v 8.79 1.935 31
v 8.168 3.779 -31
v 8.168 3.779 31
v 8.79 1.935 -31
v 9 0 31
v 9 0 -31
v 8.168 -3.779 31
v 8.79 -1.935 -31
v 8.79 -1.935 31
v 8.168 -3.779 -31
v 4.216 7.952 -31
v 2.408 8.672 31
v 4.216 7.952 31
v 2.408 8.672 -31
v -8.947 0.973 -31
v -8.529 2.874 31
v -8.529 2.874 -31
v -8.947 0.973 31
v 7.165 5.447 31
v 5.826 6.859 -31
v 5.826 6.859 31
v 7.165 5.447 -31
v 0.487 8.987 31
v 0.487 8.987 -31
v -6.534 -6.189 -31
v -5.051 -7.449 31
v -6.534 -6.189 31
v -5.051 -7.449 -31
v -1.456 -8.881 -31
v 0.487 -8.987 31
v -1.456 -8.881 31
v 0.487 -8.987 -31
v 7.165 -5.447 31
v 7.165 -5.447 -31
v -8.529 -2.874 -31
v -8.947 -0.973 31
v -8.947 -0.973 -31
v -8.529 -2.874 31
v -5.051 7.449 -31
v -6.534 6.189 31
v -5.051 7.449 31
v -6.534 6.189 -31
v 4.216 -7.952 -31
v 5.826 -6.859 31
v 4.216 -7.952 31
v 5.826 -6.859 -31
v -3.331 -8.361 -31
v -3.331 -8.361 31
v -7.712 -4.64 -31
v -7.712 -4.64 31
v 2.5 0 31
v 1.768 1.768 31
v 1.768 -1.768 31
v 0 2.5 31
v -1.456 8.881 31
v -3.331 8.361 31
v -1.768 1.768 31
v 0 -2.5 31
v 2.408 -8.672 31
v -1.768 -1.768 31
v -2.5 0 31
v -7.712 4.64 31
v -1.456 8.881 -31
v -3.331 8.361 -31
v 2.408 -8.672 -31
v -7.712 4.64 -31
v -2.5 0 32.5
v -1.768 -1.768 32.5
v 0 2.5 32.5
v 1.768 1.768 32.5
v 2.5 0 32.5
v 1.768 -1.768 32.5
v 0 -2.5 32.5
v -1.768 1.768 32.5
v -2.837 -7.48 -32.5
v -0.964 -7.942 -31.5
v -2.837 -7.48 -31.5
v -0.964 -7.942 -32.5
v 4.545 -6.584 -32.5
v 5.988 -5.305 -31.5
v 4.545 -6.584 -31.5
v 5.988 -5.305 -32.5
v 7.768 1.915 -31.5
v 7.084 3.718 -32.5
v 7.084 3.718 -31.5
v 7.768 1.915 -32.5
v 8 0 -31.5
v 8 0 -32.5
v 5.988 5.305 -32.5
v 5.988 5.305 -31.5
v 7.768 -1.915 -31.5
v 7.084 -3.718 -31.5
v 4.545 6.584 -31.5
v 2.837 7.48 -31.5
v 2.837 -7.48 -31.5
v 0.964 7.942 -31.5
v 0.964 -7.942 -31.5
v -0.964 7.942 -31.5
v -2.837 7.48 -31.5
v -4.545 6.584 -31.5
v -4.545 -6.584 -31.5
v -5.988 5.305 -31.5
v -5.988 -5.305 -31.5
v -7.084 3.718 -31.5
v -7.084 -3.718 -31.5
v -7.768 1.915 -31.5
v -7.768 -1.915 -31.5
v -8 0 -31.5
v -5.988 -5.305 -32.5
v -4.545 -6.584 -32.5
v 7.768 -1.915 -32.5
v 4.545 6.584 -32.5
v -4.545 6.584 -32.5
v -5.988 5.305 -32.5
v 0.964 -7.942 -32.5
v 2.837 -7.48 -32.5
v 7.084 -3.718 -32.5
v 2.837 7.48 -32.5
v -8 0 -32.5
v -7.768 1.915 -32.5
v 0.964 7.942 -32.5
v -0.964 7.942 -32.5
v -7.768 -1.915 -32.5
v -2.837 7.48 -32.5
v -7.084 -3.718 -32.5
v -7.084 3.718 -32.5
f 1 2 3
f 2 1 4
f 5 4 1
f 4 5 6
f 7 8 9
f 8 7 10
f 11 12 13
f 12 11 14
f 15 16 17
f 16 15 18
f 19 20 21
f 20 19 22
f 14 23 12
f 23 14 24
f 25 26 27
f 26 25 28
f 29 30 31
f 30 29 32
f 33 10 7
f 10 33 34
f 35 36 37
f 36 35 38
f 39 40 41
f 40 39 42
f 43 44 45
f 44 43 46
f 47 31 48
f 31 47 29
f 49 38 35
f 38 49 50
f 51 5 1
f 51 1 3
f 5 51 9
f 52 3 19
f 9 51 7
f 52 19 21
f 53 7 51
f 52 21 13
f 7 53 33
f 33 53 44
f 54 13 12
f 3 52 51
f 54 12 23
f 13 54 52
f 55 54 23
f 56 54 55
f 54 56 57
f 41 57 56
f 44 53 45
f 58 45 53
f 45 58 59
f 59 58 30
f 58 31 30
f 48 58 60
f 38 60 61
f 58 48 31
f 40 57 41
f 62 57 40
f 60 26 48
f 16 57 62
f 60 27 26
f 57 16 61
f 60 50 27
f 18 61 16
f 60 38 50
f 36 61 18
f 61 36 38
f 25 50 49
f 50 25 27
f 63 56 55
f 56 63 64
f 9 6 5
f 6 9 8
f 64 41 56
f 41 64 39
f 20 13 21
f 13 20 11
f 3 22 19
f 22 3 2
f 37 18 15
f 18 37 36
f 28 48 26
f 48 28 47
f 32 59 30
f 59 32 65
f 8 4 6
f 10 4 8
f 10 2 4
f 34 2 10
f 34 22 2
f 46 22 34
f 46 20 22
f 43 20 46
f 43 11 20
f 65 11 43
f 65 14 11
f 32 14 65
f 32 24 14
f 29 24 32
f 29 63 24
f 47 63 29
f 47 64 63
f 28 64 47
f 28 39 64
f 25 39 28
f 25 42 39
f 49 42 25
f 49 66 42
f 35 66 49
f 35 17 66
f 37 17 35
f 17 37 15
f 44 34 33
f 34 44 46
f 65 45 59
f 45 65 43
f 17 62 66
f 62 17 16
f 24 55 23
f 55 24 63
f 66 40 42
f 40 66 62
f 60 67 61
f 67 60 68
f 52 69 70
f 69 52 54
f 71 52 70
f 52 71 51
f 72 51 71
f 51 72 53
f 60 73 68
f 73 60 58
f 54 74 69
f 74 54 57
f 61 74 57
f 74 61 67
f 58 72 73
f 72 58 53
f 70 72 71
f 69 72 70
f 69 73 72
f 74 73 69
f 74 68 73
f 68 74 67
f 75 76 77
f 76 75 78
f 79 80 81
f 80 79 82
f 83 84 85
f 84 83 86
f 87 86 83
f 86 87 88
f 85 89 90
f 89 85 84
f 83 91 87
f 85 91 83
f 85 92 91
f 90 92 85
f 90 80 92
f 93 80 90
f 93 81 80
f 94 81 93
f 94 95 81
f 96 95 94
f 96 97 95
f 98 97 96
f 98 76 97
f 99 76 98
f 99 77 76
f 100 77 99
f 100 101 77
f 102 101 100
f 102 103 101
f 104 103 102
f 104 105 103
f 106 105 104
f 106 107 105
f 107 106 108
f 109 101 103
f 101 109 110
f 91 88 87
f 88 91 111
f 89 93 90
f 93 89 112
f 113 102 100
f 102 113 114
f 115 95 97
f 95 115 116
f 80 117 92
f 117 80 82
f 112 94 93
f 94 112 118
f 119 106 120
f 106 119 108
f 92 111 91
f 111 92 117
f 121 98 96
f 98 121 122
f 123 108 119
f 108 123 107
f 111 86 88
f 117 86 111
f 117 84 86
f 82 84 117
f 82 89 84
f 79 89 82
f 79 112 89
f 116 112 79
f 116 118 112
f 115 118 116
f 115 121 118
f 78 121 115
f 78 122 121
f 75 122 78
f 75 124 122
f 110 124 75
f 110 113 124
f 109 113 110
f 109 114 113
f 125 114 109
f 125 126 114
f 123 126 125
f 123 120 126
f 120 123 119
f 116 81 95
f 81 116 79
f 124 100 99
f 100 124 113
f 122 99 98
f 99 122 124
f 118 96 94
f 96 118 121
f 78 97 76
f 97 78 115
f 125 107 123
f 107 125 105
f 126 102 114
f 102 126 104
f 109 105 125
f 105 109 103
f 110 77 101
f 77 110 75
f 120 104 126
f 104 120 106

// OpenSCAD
// Parameters for the battery cell
battery_diameter = 18; // Diameter of the battery
battery_height = 65;   // Total height of the battery

// Parameters for the positive terminal
positive_terminal_diameter = 5;
positive_terminal_height = 2;

// Parameters for the negative terminal
negative_terminal_diameter = 16;
negative_terminal_height = 1;

// Function to create the cylindrical cell body
module cylindrical_cell_body() {
    cylinder(d = battery_diameter, h = battery_height - positive_terminal_height - negative_terminal_height, center = true);
}

// Function to create the positive terminal button
module positive_terminal_button() {
    translate([0, 0, battery_height/2 - positive_terminal_height/2])
        cylinder(d = positive_terminal_diameter, h = positive_terminal_height, center = true);
}

// Function to create the negative terminal contact
module negative_terminal_contact() {
    translate([0, 0, -battery_height/2 + negative_terminal_height/2])
        cylinder(d = negative_terminal_diameter, h = negative_terminal_height, center = true);
}

// Main battery module
module battery() {
    cylindrical_cell_body();
    positive_terminal_button();
    negative_terminal_contact();
}

// Render the battery
battery();
